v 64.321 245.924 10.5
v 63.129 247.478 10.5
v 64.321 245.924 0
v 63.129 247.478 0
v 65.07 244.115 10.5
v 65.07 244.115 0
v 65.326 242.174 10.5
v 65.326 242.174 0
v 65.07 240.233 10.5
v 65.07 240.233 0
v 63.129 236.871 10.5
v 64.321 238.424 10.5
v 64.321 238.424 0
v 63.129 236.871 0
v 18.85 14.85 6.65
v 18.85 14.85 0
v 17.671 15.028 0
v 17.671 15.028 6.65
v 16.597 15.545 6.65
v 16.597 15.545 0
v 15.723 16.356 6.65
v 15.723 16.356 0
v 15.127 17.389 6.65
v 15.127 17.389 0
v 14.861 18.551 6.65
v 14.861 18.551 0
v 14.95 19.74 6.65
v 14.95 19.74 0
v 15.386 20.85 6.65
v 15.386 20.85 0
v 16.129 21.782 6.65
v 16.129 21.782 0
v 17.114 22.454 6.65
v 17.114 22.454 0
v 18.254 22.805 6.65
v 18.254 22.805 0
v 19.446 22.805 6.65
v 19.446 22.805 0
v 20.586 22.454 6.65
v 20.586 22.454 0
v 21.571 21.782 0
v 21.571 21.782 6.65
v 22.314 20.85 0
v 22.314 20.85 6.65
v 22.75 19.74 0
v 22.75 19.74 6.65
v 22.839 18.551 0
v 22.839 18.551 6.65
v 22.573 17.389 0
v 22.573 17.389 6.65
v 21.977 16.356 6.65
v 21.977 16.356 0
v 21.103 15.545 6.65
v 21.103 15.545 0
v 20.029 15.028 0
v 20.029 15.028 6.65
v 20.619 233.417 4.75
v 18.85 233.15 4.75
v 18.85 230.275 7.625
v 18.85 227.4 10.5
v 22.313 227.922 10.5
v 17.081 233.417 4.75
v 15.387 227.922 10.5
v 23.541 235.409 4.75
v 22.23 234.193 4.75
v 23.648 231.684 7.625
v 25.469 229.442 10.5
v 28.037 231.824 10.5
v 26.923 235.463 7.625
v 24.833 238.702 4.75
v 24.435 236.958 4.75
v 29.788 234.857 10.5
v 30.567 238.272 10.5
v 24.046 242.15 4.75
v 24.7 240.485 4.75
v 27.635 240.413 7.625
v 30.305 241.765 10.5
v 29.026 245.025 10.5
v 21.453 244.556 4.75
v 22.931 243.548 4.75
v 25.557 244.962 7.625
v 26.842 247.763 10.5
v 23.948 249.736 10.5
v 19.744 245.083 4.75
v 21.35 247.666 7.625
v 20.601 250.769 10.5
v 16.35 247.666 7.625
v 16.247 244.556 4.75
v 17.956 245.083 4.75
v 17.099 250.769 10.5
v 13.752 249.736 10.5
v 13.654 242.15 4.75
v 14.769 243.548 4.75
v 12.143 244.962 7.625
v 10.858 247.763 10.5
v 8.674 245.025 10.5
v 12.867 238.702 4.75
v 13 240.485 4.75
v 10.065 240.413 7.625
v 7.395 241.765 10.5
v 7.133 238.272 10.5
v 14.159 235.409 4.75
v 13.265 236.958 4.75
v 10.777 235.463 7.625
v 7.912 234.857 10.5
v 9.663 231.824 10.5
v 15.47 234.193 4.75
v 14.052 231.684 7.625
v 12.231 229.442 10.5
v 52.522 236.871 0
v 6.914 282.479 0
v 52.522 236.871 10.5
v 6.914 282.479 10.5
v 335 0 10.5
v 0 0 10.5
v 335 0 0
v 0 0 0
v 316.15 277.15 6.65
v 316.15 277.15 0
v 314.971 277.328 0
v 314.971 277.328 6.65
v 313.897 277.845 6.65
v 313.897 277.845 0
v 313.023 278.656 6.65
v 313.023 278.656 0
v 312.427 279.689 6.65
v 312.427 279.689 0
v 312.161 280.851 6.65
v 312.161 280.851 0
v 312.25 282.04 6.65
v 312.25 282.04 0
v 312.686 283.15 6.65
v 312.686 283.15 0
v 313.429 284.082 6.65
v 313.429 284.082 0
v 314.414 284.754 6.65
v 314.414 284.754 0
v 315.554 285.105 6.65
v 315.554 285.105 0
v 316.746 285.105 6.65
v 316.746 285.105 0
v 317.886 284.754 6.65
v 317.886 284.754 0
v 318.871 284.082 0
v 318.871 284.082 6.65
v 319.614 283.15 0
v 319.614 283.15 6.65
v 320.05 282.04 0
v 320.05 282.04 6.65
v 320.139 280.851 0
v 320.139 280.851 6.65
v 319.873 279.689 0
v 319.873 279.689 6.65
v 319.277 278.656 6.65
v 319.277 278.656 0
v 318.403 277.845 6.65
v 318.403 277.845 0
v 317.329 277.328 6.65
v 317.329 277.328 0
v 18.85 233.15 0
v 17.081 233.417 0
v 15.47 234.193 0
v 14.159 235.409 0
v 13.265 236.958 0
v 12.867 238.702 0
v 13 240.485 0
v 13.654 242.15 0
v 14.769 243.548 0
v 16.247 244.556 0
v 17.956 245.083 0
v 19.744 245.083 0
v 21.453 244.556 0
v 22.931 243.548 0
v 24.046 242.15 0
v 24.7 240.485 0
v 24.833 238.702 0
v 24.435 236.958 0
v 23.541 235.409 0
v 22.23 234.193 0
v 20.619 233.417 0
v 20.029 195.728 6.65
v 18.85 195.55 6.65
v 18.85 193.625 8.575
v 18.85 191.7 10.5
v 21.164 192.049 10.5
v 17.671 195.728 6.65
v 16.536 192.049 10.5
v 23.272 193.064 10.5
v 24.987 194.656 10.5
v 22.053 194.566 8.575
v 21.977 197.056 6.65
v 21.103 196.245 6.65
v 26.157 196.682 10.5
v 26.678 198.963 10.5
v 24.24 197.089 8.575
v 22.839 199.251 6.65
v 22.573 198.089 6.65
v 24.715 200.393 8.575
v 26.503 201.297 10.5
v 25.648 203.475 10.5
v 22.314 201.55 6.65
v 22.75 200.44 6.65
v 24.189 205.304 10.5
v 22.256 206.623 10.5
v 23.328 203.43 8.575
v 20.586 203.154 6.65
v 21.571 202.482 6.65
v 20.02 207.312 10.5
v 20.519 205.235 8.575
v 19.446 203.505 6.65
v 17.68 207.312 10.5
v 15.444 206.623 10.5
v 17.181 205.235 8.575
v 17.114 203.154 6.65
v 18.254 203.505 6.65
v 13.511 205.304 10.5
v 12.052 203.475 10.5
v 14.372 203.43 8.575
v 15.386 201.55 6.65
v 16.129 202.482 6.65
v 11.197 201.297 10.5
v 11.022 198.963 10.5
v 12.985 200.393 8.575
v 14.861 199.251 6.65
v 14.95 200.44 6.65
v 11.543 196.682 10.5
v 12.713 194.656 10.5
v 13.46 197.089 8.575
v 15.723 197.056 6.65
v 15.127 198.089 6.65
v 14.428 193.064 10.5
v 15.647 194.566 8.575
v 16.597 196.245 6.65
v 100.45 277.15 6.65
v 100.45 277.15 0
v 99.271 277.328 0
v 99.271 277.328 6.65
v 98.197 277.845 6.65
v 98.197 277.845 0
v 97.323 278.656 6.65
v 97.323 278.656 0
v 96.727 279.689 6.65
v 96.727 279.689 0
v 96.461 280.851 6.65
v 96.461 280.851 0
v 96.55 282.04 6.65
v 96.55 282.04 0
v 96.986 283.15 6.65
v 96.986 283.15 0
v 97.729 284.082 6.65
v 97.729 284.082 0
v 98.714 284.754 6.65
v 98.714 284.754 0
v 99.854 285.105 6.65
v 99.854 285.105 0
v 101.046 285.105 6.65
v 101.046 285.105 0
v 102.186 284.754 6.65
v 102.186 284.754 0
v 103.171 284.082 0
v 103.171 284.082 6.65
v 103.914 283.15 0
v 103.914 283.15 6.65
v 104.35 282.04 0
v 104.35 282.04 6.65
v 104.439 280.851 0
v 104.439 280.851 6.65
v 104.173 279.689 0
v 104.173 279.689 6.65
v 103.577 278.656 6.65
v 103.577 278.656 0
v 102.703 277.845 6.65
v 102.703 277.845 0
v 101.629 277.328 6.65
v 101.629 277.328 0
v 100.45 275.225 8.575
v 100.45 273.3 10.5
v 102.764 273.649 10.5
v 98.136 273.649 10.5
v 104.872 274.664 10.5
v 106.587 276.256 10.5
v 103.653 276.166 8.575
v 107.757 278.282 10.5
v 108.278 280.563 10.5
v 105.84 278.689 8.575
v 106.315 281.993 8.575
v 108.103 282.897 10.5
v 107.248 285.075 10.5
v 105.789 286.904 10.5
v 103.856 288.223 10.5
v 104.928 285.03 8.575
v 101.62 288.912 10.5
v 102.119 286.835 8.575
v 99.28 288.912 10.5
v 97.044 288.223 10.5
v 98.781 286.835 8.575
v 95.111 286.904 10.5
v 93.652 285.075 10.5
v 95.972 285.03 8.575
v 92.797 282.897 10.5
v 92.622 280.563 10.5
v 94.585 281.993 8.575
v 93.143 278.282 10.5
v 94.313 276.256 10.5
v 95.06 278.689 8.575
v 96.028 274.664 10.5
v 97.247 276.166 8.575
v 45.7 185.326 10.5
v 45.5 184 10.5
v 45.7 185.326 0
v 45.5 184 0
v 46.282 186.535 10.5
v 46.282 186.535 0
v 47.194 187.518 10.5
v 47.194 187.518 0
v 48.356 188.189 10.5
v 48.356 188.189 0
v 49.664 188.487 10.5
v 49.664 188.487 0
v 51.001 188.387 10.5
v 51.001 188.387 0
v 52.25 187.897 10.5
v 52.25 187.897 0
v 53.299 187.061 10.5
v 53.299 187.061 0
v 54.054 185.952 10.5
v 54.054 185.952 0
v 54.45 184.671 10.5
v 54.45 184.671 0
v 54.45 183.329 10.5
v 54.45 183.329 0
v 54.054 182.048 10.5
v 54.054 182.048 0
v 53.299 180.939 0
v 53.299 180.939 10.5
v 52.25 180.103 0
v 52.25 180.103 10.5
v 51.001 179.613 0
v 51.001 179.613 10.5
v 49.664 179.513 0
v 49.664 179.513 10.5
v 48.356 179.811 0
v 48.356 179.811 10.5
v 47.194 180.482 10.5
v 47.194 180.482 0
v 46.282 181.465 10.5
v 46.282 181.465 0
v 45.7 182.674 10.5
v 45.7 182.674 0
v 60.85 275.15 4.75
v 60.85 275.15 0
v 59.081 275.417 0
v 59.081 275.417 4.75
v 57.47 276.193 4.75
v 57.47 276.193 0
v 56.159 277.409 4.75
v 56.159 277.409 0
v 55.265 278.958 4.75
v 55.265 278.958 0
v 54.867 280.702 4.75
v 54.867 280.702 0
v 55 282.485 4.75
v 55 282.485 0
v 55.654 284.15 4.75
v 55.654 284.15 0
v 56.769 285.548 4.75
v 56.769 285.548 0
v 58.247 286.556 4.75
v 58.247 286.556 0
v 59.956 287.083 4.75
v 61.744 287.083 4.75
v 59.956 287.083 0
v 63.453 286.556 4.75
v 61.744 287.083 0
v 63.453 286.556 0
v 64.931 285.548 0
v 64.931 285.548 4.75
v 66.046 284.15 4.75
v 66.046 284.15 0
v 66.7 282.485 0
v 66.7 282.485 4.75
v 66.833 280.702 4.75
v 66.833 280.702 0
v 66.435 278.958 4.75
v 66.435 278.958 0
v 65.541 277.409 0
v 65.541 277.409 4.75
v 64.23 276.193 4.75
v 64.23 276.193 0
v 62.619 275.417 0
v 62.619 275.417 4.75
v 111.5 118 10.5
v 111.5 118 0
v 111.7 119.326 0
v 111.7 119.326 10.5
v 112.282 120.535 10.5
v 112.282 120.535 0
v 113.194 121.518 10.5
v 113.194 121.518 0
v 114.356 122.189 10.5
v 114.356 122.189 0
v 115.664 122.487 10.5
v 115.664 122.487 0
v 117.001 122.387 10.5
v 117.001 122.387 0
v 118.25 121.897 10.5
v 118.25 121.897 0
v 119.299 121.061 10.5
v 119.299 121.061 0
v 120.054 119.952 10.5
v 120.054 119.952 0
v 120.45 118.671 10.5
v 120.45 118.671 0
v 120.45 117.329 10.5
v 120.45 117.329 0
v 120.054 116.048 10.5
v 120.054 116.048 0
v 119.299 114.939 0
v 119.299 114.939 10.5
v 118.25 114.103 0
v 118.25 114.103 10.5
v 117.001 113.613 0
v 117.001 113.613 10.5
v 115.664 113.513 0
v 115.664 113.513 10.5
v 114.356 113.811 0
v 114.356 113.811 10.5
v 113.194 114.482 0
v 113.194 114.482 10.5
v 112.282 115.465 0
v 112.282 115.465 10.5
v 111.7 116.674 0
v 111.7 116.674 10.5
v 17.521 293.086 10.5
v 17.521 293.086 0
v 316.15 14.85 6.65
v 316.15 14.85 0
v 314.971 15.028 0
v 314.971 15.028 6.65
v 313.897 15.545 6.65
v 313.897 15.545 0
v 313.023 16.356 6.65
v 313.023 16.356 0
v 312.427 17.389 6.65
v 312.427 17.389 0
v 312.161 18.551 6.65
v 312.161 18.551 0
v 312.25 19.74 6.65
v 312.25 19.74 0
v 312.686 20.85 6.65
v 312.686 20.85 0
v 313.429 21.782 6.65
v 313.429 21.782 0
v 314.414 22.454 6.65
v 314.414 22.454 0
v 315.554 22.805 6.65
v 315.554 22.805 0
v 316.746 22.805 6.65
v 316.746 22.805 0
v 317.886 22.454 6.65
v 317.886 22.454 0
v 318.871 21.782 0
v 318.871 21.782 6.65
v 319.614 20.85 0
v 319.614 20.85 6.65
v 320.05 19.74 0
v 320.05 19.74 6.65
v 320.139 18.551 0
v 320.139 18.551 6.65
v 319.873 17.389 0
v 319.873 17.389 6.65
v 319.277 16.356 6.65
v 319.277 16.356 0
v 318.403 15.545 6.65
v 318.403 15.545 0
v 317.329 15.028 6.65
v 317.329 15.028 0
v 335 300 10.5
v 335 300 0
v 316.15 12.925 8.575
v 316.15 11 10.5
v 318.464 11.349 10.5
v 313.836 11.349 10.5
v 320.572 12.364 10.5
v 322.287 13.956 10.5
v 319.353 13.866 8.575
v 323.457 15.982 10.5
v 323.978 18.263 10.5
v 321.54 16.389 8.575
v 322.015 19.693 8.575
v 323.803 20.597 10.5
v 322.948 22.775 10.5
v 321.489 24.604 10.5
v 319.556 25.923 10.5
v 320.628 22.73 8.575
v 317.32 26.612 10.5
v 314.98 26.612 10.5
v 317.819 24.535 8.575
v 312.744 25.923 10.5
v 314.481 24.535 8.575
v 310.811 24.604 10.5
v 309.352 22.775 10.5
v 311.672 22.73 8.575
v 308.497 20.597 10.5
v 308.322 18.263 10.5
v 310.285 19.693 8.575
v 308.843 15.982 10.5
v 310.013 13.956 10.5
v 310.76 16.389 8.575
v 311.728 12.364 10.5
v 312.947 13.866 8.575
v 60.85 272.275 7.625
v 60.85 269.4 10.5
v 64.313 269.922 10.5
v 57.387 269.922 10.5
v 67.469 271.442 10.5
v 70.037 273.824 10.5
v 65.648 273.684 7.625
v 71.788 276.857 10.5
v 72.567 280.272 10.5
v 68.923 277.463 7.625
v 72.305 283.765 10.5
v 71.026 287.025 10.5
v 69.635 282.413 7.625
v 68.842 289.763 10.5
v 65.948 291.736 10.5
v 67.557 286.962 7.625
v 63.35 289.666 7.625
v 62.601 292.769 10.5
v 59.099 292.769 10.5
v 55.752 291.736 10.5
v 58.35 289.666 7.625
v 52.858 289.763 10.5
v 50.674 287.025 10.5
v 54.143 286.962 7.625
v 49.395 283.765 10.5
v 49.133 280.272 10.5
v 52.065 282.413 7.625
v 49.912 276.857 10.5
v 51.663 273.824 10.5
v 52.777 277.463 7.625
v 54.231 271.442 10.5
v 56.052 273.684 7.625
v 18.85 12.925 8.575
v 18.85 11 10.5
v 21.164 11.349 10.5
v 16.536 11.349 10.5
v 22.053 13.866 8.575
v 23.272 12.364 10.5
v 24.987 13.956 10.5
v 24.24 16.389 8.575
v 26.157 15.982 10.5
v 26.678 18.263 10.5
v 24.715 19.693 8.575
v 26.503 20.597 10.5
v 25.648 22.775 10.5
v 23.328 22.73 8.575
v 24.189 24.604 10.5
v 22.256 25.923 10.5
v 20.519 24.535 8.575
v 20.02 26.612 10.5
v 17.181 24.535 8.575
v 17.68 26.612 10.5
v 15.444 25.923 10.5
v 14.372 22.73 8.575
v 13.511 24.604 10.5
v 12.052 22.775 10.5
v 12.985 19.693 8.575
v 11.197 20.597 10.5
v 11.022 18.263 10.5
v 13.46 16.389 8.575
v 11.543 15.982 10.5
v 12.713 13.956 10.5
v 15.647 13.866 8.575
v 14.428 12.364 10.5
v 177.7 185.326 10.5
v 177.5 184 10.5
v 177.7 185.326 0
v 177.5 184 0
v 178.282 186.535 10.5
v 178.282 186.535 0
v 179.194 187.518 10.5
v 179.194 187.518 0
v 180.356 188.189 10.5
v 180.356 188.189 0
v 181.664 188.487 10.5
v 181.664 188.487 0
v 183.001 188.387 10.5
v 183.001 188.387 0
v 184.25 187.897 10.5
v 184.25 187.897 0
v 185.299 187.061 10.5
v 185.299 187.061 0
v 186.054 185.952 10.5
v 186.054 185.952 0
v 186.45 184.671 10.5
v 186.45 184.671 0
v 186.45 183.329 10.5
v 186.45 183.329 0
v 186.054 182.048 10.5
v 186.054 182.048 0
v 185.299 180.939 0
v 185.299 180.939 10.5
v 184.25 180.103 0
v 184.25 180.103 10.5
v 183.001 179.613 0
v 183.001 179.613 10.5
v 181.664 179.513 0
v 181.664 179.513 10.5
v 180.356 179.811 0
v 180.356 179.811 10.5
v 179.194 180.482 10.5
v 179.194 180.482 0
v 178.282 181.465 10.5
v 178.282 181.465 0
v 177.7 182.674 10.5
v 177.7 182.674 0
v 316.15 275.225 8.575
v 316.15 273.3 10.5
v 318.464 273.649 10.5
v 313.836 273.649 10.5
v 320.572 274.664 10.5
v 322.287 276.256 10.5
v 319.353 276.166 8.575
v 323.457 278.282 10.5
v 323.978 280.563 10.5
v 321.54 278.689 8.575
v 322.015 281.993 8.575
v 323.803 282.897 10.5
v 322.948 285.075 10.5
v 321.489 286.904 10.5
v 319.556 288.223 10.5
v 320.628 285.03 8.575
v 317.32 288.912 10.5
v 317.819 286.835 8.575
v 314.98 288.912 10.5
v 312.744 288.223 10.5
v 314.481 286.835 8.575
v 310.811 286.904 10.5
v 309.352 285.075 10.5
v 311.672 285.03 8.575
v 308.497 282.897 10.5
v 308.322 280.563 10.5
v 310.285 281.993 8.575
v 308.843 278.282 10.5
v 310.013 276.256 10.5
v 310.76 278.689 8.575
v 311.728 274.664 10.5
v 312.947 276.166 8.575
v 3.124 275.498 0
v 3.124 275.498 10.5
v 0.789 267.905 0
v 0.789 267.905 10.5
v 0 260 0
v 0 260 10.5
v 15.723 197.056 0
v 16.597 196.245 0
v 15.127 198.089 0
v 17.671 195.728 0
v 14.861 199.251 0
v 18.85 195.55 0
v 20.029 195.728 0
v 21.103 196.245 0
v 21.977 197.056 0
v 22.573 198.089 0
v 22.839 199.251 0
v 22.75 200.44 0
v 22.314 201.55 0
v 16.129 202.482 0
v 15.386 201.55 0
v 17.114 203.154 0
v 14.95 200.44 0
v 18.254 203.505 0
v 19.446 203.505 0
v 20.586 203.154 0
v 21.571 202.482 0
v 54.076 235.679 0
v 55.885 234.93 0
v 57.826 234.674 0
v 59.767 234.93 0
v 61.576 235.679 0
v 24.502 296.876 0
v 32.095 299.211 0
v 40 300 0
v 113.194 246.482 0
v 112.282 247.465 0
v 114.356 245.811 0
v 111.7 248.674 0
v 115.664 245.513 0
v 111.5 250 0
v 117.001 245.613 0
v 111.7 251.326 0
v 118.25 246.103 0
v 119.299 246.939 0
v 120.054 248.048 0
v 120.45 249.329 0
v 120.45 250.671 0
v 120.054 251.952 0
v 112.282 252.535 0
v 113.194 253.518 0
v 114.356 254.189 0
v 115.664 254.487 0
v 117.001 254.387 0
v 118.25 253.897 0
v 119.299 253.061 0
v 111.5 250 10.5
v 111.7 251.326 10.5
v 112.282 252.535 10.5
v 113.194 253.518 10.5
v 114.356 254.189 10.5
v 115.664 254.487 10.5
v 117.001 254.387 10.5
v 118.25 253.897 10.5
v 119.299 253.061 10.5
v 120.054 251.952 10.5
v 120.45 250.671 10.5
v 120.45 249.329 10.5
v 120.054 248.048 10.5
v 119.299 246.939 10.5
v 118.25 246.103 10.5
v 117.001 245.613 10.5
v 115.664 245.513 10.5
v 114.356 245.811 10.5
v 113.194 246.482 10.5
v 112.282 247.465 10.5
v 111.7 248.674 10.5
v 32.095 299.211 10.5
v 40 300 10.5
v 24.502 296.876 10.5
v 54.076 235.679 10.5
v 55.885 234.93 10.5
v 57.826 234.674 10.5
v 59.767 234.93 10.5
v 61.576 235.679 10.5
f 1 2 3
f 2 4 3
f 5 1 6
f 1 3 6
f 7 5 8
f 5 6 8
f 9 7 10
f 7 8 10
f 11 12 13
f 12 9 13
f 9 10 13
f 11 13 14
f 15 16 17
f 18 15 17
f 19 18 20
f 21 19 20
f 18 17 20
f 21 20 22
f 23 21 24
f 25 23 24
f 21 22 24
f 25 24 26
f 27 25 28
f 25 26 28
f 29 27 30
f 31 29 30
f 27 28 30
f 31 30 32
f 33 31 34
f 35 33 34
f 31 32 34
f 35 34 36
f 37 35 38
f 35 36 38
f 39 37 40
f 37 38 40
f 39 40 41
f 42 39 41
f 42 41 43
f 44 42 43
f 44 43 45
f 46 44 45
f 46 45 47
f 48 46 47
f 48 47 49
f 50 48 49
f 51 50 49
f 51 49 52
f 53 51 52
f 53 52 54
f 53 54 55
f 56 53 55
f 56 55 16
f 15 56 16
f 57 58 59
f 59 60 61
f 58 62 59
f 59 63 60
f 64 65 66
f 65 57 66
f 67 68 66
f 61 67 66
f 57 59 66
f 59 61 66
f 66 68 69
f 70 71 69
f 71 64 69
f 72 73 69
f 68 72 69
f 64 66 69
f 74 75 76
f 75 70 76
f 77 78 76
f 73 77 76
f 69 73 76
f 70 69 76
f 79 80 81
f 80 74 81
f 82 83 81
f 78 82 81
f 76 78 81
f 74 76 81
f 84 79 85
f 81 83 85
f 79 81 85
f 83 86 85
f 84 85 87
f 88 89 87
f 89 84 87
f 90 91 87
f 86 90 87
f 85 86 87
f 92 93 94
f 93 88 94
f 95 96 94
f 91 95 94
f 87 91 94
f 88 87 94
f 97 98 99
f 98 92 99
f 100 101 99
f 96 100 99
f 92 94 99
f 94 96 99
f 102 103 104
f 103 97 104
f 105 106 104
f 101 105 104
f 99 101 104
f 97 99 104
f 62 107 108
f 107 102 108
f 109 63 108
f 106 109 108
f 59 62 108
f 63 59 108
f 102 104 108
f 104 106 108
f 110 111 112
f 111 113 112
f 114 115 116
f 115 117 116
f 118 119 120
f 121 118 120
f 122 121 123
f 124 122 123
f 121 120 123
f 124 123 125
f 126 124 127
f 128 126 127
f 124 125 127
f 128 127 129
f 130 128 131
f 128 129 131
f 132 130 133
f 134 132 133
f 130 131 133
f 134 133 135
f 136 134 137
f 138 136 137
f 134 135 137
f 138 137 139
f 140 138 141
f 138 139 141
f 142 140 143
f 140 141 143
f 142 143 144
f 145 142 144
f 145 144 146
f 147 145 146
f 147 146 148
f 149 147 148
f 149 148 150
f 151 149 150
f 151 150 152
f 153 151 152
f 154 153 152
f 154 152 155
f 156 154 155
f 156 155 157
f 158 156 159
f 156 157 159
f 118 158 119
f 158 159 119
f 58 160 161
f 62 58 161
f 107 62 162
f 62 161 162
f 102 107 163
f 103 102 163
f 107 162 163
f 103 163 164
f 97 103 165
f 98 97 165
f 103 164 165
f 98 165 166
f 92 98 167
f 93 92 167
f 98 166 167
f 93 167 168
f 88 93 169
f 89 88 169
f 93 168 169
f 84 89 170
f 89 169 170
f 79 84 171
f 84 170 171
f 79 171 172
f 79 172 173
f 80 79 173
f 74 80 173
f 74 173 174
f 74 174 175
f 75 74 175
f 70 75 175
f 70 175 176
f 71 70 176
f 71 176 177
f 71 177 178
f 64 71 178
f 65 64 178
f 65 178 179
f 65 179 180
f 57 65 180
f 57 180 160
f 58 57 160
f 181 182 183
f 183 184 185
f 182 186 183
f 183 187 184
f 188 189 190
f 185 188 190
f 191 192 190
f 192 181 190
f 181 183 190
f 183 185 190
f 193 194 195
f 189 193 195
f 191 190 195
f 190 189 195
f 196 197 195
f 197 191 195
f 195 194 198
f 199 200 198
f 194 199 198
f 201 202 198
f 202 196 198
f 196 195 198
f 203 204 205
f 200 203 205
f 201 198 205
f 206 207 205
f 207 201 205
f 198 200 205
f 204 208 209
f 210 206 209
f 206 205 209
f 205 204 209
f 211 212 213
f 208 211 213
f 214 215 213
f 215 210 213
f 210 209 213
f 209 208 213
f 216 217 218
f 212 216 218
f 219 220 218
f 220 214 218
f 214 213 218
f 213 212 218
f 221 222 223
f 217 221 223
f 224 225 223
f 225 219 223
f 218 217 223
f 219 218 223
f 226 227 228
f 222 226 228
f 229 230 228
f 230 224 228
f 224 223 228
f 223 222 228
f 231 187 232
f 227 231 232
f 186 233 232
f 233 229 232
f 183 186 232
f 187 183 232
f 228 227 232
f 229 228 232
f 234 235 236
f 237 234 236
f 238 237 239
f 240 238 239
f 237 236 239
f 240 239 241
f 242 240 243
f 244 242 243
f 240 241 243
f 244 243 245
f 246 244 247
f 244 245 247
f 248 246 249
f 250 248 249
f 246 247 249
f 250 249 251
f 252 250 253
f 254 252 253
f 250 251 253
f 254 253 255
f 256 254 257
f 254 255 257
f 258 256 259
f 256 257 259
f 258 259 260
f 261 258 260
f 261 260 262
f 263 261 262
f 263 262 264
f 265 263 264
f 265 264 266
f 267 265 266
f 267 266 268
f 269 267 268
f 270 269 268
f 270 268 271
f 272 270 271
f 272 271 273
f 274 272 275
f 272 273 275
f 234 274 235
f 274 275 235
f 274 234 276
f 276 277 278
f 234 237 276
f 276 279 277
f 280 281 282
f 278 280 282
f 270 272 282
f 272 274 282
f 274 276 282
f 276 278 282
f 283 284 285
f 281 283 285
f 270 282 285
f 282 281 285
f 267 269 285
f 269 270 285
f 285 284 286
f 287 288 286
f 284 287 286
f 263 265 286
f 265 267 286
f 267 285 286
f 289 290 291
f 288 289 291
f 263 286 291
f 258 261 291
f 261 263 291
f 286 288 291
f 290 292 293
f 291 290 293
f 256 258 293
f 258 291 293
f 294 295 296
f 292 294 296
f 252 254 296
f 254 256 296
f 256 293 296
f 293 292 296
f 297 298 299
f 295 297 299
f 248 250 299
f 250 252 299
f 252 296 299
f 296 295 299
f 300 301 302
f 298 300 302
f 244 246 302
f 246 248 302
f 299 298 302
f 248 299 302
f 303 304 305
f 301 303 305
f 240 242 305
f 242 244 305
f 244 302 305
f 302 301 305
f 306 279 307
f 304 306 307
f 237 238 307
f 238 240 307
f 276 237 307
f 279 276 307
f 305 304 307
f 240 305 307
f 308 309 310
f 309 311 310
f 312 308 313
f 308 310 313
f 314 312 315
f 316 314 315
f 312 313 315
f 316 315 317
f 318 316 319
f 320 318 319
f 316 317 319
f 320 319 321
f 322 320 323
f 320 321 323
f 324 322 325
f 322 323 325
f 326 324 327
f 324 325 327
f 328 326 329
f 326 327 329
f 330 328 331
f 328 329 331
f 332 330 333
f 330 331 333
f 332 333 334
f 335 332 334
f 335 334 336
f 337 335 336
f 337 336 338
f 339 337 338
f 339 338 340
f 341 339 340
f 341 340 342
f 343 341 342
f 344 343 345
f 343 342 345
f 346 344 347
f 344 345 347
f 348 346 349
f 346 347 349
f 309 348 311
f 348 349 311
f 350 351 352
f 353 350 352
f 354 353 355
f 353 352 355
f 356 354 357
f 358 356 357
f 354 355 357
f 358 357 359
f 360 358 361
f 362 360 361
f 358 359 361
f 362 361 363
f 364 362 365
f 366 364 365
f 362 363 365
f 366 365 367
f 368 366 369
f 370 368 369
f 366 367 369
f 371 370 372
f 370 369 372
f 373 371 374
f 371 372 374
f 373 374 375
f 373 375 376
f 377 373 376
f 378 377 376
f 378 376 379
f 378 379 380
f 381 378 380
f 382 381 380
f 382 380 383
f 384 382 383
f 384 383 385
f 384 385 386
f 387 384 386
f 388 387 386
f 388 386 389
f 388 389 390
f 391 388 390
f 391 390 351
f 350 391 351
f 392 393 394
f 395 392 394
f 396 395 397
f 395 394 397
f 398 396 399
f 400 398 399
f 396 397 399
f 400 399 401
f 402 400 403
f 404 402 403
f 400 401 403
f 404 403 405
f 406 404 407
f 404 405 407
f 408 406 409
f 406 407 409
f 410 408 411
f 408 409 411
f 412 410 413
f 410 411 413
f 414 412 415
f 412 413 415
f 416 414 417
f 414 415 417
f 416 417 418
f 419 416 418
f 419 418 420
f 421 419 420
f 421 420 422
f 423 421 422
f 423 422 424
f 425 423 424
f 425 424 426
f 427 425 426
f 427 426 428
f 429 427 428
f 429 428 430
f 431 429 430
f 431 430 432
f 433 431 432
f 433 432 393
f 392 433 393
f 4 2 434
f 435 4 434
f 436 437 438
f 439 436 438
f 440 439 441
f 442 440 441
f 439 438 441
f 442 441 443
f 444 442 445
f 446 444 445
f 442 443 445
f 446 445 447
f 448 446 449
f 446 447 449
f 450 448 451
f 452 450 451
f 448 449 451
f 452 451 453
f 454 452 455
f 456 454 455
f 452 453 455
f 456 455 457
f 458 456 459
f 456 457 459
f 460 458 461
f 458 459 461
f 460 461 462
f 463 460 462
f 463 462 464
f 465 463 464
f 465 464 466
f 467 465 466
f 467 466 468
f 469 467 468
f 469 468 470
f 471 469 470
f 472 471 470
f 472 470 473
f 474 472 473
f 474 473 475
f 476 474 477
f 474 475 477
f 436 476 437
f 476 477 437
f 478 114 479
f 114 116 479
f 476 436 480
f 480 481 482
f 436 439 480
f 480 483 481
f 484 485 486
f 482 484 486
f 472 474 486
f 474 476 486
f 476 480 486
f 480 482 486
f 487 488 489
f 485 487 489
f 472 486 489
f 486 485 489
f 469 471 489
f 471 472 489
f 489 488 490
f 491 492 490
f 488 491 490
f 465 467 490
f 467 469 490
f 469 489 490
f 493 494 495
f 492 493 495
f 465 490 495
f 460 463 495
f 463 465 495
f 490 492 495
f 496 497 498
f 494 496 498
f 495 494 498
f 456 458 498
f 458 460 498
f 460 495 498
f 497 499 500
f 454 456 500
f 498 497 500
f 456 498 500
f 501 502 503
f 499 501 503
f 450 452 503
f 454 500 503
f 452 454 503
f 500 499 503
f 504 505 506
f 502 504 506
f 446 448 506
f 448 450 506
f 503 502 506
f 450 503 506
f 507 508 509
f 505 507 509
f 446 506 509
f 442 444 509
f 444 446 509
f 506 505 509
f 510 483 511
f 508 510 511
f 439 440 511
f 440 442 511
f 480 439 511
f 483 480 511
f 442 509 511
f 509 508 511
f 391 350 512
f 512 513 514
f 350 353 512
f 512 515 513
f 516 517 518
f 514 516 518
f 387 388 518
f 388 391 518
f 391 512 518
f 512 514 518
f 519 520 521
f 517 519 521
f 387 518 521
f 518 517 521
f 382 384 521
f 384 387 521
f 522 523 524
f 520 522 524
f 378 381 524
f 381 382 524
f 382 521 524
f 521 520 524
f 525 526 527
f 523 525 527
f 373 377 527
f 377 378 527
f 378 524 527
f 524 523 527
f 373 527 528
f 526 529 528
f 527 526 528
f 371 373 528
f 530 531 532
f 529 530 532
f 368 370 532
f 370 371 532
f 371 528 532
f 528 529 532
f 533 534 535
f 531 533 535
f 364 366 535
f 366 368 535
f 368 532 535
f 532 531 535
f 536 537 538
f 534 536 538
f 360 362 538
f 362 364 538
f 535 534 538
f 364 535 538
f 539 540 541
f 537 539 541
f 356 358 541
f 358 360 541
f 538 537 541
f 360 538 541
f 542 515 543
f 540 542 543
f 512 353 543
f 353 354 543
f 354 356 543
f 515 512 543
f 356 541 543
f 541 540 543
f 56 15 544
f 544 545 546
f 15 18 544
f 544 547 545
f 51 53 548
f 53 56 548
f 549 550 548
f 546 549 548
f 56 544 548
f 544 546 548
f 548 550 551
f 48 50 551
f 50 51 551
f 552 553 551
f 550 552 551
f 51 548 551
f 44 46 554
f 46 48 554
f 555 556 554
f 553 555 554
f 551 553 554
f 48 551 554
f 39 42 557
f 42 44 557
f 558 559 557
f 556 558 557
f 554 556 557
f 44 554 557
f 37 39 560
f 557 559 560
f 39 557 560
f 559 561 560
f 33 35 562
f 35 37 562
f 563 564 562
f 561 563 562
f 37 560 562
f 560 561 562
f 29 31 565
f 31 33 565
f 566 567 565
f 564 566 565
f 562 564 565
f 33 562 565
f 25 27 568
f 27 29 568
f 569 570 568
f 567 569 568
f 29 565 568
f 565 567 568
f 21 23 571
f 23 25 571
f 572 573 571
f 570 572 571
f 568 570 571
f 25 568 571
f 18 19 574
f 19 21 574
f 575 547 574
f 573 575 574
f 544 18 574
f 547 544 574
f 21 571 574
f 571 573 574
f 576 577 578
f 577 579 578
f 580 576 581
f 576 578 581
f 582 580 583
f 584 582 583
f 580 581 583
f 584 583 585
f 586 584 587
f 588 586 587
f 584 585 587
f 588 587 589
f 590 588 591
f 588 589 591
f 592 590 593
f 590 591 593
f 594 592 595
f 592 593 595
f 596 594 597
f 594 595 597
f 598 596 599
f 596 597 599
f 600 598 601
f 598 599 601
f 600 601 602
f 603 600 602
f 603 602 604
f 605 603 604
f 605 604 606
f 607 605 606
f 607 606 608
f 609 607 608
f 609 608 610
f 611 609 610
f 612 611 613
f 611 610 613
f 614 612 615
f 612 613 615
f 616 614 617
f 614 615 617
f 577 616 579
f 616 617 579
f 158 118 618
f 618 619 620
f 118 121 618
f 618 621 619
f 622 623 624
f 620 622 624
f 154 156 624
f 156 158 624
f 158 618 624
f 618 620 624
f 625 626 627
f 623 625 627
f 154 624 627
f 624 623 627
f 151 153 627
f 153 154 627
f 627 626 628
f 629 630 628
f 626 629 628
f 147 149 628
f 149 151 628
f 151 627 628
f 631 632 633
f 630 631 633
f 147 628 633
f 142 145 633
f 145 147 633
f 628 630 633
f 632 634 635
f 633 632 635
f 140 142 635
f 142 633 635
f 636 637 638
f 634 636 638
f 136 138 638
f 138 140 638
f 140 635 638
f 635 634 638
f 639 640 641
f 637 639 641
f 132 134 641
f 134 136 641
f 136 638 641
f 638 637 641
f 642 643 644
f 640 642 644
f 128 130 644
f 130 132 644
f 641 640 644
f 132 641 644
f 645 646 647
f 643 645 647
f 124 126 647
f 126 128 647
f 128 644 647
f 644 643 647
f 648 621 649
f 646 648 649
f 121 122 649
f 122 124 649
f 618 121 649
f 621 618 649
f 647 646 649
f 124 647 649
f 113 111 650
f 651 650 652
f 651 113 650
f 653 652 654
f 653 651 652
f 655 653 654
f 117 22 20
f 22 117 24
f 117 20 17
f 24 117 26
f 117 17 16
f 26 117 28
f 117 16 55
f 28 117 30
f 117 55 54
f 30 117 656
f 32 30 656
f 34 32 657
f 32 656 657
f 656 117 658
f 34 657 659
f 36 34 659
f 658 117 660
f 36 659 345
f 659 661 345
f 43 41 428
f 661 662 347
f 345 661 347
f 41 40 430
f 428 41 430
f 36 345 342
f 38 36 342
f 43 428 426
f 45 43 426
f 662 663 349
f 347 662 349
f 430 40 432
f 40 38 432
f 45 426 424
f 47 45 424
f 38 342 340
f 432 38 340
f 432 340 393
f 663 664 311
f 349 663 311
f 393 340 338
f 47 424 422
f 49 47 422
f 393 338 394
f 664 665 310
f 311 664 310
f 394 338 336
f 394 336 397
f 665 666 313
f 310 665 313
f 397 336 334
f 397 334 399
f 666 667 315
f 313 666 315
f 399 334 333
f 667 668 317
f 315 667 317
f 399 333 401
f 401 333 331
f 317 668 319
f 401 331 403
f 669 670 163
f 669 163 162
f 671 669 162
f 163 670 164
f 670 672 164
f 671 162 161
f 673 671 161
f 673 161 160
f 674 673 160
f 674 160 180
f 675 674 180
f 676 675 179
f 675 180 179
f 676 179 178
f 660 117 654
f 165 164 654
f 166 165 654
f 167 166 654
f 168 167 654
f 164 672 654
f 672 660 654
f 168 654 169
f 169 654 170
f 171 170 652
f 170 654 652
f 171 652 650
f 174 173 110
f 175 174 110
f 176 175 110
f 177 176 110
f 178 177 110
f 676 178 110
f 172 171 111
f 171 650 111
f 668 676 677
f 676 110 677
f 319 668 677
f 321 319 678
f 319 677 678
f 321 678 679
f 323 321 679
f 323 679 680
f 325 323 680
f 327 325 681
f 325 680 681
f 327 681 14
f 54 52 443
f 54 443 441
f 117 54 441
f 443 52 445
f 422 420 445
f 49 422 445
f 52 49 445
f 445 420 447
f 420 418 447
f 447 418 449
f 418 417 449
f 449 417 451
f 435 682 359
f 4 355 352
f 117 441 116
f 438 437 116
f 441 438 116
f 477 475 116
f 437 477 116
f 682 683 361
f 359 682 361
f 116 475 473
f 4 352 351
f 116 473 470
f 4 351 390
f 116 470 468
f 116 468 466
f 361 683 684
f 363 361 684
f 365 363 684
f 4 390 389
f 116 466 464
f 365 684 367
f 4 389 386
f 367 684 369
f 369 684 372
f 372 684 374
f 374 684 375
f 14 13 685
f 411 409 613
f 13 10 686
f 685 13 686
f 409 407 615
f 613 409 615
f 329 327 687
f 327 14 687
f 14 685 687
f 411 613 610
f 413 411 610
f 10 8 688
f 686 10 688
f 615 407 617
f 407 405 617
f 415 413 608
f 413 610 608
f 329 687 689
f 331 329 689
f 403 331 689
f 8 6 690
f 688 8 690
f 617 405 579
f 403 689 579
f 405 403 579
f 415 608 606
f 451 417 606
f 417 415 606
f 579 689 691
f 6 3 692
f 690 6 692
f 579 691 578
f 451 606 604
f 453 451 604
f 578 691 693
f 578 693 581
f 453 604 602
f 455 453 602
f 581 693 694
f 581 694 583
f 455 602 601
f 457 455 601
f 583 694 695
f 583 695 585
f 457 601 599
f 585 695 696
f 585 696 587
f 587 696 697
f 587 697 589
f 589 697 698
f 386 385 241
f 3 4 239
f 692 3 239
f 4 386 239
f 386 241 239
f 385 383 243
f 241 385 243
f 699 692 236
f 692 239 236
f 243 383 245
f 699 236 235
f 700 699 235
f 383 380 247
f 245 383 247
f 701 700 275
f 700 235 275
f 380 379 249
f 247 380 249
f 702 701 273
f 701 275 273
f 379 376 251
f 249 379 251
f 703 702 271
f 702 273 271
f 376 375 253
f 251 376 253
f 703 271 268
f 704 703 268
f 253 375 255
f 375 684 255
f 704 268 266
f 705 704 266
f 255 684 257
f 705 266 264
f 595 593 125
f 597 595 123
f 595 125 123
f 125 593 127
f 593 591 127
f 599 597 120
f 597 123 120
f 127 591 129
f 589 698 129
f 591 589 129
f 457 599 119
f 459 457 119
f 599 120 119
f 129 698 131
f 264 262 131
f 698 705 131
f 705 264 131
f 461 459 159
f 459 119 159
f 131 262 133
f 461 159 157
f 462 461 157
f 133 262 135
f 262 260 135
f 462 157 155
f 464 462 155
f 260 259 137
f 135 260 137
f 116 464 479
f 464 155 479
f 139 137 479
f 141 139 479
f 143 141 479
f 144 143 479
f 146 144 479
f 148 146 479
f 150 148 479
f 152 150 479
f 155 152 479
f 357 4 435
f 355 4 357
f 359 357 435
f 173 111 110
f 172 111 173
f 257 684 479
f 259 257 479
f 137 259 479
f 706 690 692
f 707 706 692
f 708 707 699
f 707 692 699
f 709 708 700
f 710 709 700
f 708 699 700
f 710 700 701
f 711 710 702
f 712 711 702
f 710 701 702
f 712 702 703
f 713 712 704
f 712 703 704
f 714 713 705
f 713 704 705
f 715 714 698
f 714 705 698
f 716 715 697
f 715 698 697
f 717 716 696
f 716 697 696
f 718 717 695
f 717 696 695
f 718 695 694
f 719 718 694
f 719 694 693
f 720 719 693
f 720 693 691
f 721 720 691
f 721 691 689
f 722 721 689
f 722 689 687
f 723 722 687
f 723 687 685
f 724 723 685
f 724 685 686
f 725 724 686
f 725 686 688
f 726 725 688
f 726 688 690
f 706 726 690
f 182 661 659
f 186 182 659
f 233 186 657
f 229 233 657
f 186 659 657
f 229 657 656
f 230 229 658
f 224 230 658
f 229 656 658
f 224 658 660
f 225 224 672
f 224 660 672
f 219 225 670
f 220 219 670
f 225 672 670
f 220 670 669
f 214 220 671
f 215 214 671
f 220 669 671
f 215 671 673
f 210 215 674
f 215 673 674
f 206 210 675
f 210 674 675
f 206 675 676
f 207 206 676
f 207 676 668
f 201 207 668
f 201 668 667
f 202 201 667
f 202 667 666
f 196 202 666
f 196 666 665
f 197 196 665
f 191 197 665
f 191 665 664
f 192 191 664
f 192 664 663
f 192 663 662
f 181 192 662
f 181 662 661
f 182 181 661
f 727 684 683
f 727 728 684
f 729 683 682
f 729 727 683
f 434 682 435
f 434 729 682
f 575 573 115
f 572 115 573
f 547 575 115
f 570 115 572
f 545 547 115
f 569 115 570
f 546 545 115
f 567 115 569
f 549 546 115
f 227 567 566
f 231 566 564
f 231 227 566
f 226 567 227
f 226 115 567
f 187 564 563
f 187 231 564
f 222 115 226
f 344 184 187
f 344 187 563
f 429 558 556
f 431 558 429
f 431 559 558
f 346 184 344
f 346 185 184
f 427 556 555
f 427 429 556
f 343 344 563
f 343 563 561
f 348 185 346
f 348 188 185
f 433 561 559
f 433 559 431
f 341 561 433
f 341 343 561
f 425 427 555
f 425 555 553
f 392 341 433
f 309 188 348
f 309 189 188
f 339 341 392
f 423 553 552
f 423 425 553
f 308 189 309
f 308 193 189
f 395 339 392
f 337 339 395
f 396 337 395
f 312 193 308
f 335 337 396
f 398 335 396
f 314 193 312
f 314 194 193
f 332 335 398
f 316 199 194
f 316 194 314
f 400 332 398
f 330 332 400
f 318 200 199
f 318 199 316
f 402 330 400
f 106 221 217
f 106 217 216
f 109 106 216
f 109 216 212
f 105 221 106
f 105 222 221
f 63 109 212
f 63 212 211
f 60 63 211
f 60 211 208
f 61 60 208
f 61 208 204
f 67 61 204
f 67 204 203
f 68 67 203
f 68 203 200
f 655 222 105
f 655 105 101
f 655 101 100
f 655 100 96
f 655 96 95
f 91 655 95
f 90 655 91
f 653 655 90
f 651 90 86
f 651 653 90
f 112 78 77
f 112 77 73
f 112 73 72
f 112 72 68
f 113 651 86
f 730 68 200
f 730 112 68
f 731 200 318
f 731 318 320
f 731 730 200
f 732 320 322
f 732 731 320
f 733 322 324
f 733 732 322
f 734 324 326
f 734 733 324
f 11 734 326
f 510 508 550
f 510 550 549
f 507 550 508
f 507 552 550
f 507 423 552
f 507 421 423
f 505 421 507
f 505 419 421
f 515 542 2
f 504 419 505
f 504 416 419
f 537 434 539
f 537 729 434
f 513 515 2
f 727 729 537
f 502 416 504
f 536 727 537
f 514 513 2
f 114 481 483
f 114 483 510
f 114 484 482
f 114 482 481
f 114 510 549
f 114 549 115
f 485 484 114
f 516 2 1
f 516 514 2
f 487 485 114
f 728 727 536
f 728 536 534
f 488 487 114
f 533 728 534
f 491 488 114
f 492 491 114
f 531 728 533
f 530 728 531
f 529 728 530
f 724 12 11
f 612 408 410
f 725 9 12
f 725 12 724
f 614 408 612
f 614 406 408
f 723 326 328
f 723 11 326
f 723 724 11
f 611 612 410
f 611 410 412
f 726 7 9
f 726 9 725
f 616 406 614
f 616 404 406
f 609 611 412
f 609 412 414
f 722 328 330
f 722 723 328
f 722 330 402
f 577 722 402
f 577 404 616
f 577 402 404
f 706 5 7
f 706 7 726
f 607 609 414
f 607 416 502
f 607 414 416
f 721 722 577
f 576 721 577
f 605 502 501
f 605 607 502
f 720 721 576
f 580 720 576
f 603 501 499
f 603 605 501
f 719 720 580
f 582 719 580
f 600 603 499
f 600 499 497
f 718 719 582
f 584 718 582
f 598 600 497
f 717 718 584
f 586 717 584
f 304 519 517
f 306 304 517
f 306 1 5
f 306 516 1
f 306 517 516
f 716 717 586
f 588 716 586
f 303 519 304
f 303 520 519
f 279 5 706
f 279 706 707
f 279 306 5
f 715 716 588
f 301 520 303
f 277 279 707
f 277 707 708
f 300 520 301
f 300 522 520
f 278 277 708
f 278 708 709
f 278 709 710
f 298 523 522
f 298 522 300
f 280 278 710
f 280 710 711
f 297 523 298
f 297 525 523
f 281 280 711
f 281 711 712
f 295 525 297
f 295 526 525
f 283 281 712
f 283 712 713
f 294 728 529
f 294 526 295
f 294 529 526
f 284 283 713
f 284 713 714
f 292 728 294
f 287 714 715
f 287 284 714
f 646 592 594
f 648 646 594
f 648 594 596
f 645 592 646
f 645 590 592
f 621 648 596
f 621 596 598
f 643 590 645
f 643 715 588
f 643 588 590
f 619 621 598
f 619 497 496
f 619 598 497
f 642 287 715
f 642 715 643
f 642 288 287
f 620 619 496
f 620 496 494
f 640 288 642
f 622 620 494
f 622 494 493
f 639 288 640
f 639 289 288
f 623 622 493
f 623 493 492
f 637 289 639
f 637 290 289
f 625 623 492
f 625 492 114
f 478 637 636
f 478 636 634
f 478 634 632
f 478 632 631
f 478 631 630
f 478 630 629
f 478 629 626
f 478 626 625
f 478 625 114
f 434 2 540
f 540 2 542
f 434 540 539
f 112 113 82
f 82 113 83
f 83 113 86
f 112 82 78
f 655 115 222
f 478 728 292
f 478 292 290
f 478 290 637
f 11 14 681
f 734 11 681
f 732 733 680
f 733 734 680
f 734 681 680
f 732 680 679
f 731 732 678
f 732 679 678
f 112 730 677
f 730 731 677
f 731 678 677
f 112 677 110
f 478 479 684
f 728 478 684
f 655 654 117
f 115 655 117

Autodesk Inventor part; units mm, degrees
ref_plane "YZ Plane" through (0, 0, 0) normal (1, 0, 0) x (0, 1, 0)
ref_plane "XZ Plane" through (0, 0, 0) normal (0, 1, 0) x (-1, 0, 0)
ref_plane "XY Plane" through (0, 0, 0) normal (0, 0, 1) x (1, 0, 0)
sketch "Sketch1" plane through (0, 0, 0) normal (0, 0, 1) x (1, 0, 0)
  line L0 (0, 0) -> (335, 0)
  line L1 (335, 0) -> (335, 300)
  line L2 (335, 300) -> (0, 300)
  line L3 (0, 300) -> (0, 0)
  dimension "d0" = 335
  dimension "d1" = 300
extrude "Plate" add sketch "Sketch1" along normal blind 10.5
sketch "Sketch3" plane through (0, 0, 10.5) normal (0, 0, 1) x (1, 0, 0)
  circle A0 centre (316.15, 18.85) radius 7.85
  line L0 (335, 0) -> (335, 300) projected
  line L1 (0, 0) -> (335, 0) projected
  circle A1 centre (316.15, 18.85) radius 4
  line L2 (0, 300) -> (0, 0) projected
  line L3 (335, 300) -> (0, 300) projected
  circle A2 centre (18.85, 199.55) radius 7.85
  circle A3 centre (100.45, 281.15) radius 7.85
  point P0 (18.85, 18.85)
  point P1 (316.15, 281.15)
  dimension "d4" = 15.7
  dimension "d5" = 18.85
  dimension "d6" = 18.85
  dimension "d7" = 8
  dimension "d8" = 18.85
  dimension "d9" = 18.85
  dimension "d10" = 18.85
  dimension "d11" = 18.85
  dimension "d19" = 18.85
  dimension "d20" = 18.85
  dimension "d21" = 15.7
  dimension "d22" = 15.7
  dimension "d23" = 180.7
  dimension "d24" = 215.7
hole "Small screw" at (18.85, 18.85, 10.5) at (316.15, 281.15, 10.5) at (316.15, 18.85, 10.5) at (18.85, 199.55, 10.5) at (100.45, 281.15, 10.5) direction (0, 0, -1) diameter 8 end through all countersink diameter 15.7 countersink angle 90
sketch "Sketch4" plane through (0, 0, 10.5) normal (0, 0, 1) x (1, 0, 0)
  circle A0 centre (100.45, 281.15) radius 7.85 projected
  circle A1 centre (18.85, 199.55) radius 7.85 projected
  circle A2 centre (18.85, 239.15) radius 11.75
  circle A3 centre (60.85, 281.15) radius 11.75
  circle A4 centre (18.85, 199.55) radius 4 projected
  circle A5 centre (18.85, 199.55) radius 7.85
  point P0 (0, 0)
  dimension "d25" = 23.5
  dimension "d26" = 23.5
  dimension "d27" = 0
  dimension "d28" = 0
  dimension "d29" = 39.6
  dimension "d30" = 15.7
  dimension "d31" = 39.6
hole "Big screw" at (60.85, 281.15, 10.5) at (18.85, 239.15, 10.5) direction (0, 0, -1) diameter 12 end through all countersink diameter 23.5 countersink angle 90
fillet "Stor runding" radius 40 1 edges at (0, 300, 5.25)
sketch "Sketch6" plane through (0, 0, 10.5) normal (0, 0, 1) x (1, 0, 0)
  arc A0 (40, 300) -> (0, 260) centre (40, 260) ccw projected
  line L0 (0, 260) -> (0, 0) projected
  line L1 (0, 0) -> (335, 0) projected
  line L2 (335, 0) -> (335, 300) projected
  line L3 (335, 300) -> (40, 300) projected
  circle A1 centre (18.85, 239.15) radius 11.75 projected
  circle A2 centre (60.85, 281.15) radius 11.75 projected
  circle A3 centre (100.45, 281.15) radius 7.85 projected
  circle A4 centre (18.85, 199.55) radius 7.85 projected
  circle A5 centre (316.15, 18.85) radius 7.85 projected
  circle A6 centre (316.15, 281.15) radius 7.85 projected
  circle A7 centre (18.85, 18.85) radius 7.85 projected
  line L4 (17.5207, 293.0859) -> (6.9141, 282.4793)
  line L5 (6.9141, 282.4793) -> (57.8257, 231.5676)
  line L6 (57.8257, 231.5676) -> (68.4324, 242.1743)
  line L7 (68.4324, 242.1743) -> (17.5207, 293.0859)
  arc A8 (40, 300) -> (0, 260) centre (40, 260) ccw projected
  dimension "d40" = 15
  dimension "d41" = 72
  dimension "d42" = 135
extrude "Extrusion2" cut sketch "Sketch6" against normal up to next contours L4 A0 | L7 L6 L5 L4
fillet "Fillet2" radius 7.5 2 edges at (68.4324, 242.1743, 5.25) (57.8257, 231.5676, 5.25)
sketch "Sketch7" plane through (0, 0, 0) normal (0, 0, -1) x (-1, 0, 0)
  circle A0 centre (-116, 184) radius 74.5 projected
  circle A1 centre (-116, 250) radius 4.5 projected
  circle A2 centre (-182, 184) radius 4.5 projected
  circle A3 centre (-116, 118) radius 4.5 projected
  circle A4 centre (-116, 118) radius 4.5 projected
  circle A5 centre (-50, 184) radius 4.5 projected
  point P0 (0, 0)
extrude "Extrusion3" cut sketch "Sketch7" against normal up to next contours A1 | A2 | A3 | A5
equation "\"d5\" = d6"
equation "\"d8\" = d6"
equation "\"d9\" = d8"
equation "\"d10\" = d9"
equation "\"d11\" = d9"
equation "\"d19\" = d11"
equation "\"d20\" = d9"
equation "\"d21\" = d4"
equation "\"d22\" = d21"
equation "\"d31\" = d29"
properties part number "Mount plate UR"
